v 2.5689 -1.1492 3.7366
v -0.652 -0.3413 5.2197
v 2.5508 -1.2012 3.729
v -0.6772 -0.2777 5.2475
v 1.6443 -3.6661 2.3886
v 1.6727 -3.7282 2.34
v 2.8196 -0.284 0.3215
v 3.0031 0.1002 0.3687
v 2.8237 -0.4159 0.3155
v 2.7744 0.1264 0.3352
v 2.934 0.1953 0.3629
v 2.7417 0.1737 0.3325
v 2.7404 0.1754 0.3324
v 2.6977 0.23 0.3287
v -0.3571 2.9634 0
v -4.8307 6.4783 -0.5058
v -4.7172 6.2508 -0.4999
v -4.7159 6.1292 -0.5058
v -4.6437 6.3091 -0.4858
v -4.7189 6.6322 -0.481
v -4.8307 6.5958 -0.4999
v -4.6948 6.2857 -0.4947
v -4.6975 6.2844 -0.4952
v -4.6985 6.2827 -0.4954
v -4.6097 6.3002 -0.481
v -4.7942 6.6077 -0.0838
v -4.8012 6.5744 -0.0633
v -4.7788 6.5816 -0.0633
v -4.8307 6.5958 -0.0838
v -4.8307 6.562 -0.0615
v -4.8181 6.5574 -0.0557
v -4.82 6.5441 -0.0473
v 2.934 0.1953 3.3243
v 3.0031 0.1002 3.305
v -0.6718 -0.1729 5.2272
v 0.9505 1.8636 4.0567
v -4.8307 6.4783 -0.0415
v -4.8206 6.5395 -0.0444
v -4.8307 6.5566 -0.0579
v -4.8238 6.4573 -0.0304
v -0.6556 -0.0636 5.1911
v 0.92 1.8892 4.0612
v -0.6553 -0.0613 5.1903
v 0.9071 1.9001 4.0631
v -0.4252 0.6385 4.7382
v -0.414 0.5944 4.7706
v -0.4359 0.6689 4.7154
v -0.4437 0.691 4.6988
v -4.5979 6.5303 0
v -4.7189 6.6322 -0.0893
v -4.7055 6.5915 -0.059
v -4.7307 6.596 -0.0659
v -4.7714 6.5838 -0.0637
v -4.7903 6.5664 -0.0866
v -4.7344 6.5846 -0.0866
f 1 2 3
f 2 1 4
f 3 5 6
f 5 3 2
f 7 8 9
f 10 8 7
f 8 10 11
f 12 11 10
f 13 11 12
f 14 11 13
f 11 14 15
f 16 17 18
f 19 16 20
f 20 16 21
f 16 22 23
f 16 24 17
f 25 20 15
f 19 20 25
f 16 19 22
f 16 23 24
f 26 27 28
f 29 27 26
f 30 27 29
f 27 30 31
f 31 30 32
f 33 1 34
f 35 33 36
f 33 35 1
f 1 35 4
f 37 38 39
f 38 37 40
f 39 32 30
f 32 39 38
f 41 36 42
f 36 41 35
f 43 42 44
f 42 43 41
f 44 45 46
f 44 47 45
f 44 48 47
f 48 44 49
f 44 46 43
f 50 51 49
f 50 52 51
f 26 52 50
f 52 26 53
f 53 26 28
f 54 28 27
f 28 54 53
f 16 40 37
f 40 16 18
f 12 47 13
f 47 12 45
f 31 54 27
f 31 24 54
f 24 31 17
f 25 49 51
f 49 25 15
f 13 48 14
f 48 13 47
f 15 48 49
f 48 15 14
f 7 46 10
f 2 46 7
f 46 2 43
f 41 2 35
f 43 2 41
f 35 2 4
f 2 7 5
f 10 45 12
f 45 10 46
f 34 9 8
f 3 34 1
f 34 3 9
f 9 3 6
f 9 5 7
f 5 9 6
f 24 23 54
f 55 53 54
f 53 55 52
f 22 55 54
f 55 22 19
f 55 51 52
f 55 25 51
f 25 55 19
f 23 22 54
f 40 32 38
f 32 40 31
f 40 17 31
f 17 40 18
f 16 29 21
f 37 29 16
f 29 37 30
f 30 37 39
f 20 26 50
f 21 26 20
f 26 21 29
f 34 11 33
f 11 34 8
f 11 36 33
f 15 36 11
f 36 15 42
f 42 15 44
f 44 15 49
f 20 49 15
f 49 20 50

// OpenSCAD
// Auto-generated OpenSCAD file

    inner_points = 10*[[0.006041051977101475, -0.8080237563375162, 0.5000000000006635], [-0.29124754295317146, 0.09537426696641924, -0.8090169943752008], [-0.29124754295042443, 0.09537426696896514, 0.8090169943746941], [-0.47498199908503275, 0.6537049507402669, -8.199552148369094e-13], [0.006041051975403666, -0.8080237563390895, -0.49999999999933664], [0.2903071489285415, 0.010018287888955535, -1.106413997394639e-12]];

    outer_points = 10*[[-0.7978099914491895, -0.2625428334534335, -0.13482312819418532], [0.8017357049911781, -0.2625428334534335, 0.10907757649728182], [-0.49942562922089523, 0.687346061483792, -0.04166809798888336], [0.4891479777378736, 0.687346061483792, 0.10907082739049428], [0.006351937941033116, -0.8496064560607167, -0.04165717770470741], [-0.07915084916165496, -0.02604313074481797, 0.5190858316964722]];

    // Convex hull for inner set (I)
    module inner_hull() {
        hull() {
            for (p = inner_points) {
                translate(p) sphere(r=0.1);
            }
        }
    }

    // Convex hull for outer set (O) minus inner hull (O \ I)
    module outer_minus_inner() {
        difference() {
            hull() {
                for (p = outer_points) {
                    translate(p) sphere(r=0.1);
                }
            }
            inner_hull(); // Subtract inner hull
        }
    }

    // Convex hull for outer set (O) minus all translated inner hulls
    module outer_minus_AllTranslationInner() {
        difference() {
            hull() {
                for (p = outer_points) {
                    translate(p) sphere(r=0.1);
                }
            }
            hull() {
                translate([0,0,50]) inner_hull();
                translate([0,0,-50]) inner_hull();
            }; // Subtract translated inner hulls
        }
    }

    // Difference between outer_minus_inner and outer_minus_AllTranslationInner
    module outer_minus_inner_diff() {
        difference() {
            // Outer minus inner
            difference() {
                hull() {
                    for (p = outer_points) {
                        translate(p) sphere(r=0.1);
                    }
                }
                inner_hull();
            }

            // Subtract Outer minus AllTranslationInner
            difference() {
                hull() {
                    for (p = outer_points) {
                        translate(p) sphere(r=0.1);
                    }
                }
                hull() {
                    translate([0,0,50]) inner_hull();
                    translate([0,0,-50]) inner_hull();
                };
            }
        }
    }

    // Rendering all with colors applied
    color([1, 1, 0, 1]) outer_minus_inner_diff(); // Opaque yellow
    
